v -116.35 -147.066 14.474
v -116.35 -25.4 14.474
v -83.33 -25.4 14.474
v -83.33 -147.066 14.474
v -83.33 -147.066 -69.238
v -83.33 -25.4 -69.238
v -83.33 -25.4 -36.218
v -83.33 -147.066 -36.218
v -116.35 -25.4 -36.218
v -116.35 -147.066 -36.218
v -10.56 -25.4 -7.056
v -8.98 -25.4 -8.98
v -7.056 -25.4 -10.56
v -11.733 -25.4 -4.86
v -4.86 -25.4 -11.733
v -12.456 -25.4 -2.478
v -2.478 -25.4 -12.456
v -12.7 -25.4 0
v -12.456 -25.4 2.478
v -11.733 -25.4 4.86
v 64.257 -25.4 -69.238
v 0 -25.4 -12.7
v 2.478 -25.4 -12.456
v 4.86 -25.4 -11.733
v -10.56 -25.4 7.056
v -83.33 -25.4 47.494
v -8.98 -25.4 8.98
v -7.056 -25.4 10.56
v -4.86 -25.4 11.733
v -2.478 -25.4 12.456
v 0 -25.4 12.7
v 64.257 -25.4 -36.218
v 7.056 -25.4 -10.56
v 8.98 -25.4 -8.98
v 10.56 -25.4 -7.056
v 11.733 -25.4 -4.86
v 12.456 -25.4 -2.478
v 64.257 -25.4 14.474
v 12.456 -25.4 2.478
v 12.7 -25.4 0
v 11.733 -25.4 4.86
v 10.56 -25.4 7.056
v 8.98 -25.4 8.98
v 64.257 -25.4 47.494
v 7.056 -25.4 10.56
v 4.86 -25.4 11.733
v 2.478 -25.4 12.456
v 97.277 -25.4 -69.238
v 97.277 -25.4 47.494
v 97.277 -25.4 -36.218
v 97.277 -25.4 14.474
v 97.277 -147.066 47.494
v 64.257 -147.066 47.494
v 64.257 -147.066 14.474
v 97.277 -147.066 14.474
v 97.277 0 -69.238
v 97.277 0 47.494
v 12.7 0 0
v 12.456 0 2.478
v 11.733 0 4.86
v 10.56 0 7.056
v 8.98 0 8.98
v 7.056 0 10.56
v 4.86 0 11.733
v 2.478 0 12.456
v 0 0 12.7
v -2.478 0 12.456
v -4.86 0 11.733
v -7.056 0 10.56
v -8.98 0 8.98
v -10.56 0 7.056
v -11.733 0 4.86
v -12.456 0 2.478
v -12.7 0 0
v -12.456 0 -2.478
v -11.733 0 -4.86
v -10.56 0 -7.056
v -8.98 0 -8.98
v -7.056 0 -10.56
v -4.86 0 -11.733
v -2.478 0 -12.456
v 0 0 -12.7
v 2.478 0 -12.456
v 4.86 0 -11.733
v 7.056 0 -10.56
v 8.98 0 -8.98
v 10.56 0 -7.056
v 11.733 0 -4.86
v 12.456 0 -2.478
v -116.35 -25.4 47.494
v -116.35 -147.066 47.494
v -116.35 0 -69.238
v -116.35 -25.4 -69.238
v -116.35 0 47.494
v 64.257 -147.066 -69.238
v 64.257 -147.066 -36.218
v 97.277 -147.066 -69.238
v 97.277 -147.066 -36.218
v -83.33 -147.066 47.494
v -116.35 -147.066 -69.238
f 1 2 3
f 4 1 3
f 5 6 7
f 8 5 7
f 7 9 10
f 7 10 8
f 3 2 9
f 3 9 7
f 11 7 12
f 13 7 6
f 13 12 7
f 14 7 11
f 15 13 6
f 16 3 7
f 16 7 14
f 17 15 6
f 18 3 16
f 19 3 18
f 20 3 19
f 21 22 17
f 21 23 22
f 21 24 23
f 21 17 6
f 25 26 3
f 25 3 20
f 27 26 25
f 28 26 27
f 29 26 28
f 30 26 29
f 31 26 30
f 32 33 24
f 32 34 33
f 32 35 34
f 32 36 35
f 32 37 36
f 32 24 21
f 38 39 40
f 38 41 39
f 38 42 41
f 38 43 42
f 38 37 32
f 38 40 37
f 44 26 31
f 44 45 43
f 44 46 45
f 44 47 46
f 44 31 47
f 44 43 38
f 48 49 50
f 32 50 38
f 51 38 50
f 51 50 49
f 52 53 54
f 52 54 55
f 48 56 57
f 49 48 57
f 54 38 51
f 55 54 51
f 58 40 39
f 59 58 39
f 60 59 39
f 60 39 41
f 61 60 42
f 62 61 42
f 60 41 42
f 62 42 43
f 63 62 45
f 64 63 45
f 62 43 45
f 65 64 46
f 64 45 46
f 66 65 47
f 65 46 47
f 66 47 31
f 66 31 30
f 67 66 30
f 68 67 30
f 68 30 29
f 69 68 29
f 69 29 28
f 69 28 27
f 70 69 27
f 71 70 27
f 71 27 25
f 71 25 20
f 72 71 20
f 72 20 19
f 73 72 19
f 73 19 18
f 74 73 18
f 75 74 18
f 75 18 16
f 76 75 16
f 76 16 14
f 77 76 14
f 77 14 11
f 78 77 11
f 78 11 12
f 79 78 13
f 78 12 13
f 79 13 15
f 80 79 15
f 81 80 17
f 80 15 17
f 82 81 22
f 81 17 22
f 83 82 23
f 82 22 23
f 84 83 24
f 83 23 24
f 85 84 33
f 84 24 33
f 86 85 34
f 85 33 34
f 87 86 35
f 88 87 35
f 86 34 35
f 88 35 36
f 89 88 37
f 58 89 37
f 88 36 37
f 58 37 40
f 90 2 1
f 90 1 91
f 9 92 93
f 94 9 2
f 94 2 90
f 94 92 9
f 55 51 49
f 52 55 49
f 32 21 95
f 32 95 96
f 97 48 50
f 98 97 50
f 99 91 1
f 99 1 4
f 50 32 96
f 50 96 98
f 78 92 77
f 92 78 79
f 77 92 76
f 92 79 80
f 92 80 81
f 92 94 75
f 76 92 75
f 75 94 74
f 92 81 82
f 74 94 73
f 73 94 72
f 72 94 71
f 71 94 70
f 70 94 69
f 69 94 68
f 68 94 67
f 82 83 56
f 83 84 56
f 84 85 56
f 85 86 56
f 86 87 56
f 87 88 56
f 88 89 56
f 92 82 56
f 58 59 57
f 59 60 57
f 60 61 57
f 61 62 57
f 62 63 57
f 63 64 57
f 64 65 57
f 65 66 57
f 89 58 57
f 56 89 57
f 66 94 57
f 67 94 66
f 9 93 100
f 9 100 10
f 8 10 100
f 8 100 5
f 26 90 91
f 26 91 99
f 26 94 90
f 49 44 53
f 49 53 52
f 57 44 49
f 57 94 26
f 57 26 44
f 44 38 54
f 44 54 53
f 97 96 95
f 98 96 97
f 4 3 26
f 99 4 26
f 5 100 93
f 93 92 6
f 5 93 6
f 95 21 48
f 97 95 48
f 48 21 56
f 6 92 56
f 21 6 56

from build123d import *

# Parameters (mm, degrees)
F0_W     = 213.626973
F0_H     = 116.731882
F1_DEPTH = 25.4
F2_W     = 33.02
F2_H     = 33.02
F3_DEPTH = 121.666
F5_D     = 25.4


with BuildPart() as f1:
    # F0 (on Front) → F1 (new body)
    with BuildSketch(Plane.XZ):
        with Locations((-9.536925, -10.872088)):
            Rectangle(F0_W, F0_H)
    extrude(amount=F1_DEPTH)

    # F2 (on face) → F3 (join)
    with BuildSketch(Plane.XZ.offset(25.4)):
        with Locations((-99.840412, 30.983853)):
            Rectangle(F2_W, F2_H)
        with Locations((80.766561, 30.983853)):
            Rectangle(F2_W, F2_H)
        with Locations((80.766561, -52.728029)):
            Rectangle(F2_W, F2_H)
        with Locations((-99.840412, -52.728029)):
            Rectangle(F2_W, F2_H)
    extrude(amount=F3_DEPTH)

    # F5 (through all)
    with Locations(Plane(origin=(0, 0, 0), x_dir=(-1, 0, 0), z_dir=(0, 1, 0))):
        with Locations((0, 0)):
            Hole(F5_D / 2)


solid = f1.part
